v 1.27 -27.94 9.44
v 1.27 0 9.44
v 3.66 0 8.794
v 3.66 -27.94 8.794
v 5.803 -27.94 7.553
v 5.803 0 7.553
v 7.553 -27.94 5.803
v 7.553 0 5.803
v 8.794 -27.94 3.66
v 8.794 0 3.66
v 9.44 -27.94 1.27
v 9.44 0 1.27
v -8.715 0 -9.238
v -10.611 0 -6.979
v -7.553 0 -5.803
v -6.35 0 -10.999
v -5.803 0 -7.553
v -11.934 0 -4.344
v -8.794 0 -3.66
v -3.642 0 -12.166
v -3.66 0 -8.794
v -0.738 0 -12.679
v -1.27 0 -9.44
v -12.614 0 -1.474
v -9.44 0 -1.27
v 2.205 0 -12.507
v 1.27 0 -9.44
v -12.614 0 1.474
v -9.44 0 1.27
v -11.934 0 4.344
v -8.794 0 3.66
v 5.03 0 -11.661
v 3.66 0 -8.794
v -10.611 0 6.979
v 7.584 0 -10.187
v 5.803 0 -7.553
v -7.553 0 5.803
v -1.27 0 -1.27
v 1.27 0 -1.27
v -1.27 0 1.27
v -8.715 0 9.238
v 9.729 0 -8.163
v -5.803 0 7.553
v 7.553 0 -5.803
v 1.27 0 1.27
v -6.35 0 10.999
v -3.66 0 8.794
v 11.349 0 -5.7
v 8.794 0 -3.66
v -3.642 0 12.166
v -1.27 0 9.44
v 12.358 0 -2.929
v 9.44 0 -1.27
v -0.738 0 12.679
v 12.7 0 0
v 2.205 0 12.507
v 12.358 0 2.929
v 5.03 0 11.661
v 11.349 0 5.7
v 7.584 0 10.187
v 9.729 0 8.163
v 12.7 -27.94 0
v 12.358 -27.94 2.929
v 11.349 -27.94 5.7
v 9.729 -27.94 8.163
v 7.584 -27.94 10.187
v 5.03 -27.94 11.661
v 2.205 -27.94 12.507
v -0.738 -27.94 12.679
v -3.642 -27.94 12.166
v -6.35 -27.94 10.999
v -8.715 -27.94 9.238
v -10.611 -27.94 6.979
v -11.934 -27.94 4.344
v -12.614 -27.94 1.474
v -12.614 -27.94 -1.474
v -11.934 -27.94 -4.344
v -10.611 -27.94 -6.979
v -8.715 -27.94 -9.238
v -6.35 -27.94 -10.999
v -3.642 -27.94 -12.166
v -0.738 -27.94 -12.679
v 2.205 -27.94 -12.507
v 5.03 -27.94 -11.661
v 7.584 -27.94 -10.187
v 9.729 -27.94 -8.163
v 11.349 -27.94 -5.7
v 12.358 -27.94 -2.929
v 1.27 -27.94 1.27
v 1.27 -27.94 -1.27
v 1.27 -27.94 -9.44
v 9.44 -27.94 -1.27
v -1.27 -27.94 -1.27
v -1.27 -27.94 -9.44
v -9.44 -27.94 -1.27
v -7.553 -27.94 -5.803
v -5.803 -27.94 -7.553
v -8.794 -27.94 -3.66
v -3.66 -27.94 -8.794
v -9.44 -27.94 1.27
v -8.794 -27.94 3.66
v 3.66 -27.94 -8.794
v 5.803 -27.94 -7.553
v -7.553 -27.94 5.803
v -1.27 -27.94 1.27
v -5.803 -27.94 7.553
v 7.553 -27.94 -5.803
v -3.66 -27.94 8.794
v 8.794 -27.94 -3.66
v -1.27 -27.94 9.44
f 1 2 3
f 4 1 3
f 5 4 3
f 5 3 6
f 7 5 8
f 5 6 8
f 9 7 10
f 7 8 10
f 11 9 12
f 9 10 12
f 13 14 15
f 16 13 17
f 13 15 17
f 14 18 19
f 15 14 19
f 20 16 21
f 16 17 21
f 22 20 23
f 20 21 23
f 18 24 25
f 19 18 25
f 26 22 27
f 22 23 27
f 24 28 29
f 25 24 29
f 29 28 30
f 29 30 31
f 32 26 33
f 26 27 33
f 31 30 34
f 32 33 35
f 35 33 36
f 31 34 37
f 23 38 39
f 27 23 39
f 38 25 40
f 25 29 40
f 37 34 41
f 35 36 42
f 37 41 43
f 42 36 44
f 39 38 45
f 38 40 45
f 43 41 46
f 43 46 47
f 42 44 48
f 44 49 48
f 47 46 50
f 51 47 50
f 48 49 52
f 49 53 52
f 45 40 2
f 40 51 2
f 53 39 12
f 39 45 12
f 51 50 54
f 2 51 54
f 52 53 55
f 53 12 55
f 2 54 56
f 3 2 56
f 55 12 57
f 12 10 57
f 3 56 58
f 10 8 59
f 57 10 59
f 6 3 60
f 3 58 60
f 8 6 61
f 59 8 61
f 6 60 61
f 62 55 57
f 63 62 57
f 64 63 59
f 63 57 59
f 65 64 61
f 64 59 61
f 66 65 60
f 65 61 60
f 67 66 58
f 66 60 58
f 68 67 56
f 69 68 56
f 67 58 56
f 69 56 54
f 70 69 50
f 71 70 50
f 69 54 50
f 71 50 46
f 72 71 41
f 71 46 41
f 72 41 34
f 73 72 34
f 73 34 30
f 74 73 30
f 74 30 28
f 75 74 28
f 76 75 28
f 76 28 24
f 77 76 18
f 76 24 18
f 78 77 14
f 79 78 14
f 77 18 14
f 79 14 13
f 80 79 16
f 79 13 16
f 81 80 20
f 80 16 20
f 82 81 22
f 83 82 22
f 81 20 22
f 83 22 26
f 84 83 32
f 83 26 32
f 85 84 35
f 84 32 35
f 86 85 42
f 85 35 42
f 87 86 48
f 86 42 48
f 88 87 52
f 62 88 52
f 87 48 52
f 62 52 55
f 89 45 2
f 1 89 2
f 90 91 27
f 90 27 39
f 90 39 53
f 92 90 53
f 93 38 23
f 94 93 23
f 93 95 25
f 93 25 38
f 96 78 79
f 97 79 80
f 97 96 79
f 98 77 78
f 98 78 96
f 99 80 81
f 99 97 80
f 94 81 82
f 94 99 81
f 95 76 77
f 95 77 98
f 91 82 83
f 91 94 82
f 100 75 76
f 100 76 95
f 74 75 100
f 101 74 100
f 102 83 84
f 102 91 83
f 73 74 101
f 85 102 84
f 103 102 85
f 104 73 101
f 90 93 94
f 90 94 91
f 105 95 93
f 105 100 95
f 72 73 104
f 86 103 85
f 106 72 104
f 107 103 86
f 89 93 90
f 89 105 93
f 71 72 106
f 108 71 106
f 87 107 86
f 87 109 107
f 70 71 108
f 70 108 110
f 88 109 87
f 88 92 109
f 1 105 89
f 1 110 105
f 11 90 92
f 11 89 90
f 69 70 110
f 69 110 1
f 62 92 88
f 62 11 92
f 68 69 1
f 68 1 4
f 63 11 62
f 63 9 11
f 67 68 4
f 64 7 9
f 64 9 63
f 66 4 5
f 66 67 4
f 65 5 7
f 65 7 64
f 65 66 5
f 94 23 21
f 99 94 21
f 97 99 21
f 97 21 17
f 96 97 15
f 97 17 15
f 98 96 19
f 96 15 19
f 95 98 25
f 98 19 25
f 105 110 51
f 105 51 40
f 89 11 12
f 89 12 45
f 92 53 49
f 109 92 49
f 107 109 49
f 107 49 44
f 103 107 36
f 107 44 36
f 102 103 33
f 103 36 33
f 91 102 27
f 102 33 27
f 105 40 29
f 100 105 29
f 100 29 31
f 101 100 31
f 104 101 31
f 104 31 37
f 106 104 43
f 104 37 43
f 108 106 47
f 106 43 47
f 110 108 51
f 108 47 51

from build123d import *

# Parameters (mm, degrees)
F0_R     = 12.7
F0_W     = 2.54
F0_H     = 2.54
F1_DEPTH = 27.94


with BuildPart() as f1:
    # F0 (on Front) → F1 (new body)
    with BuildSketch(Plane.XZ):
        Circle(F0_R)
        with BuildLine():
            ThreePointArc((1.27, 9.4399536545), (6.7351920908, 6.7351920908), (9.4399536545, 1.27))
            Line((9.4399536545, 1.27), (11.43, 1.27))
            Line((11.43, 1.27), (11.43, -1.27))
            Line((11.43, -1.27), (9.4399536545, -1.27))
            ThreePointArc((9.4399536545, -1.27), (6.7351920908, -6.7351920908), (1.27, -9.4399536545))
            Line((1.27, -9.4399536545), (1.27, -11.43))
            Line((1.27, -11.43), (-1.27, -11.43))
            Line((-1.27, -11.43), (-1.27, -9.4399536545))
            ThreePointArc((-1.27, -9.4399536545), (-6.7351920908, -6.7351920908), (-9.4399536545, -1.27))
            Line((-9.4399536545, -1.27), (-11.43, -1.27))
            Line((-11.43, -1.27), (-11.43, 1.27))
            Line((-11.43, 1.27), (-9.4399536545, 1.27))
            ThreePointArc((-9.4399536545, 1.27), (-6.7351920908, 6.7351920908), (-1.27, 9.4399536545))
            Line((-1.27, 9.4399536545), (-1.27, 11.43))
            Line((-1.27, 11.43), (1.27, 11.43))
            Line((1.27, 11.43), (1.27, 9.4399536545))
        make_face(mode=Mode.SUBTRACT)
        with BuildLine():
            ThreePointArc((9.4399536545, -1.27), (9.5037146306, -0.6364222028), (9.525, 0))
            ThreePointArc((9.525, 0), (9.5037146306, 0.6364222028), (9.4399536545, 1.27))
            Line((9.4399536545, 1.27), (1.27, 1.27))
            Line((1.27, 1.27), (1.27, -1.27))
            Line((1.27, -1.27), (9.4399536545, -1.27))
        make_face()
        with BuildLine():
            Line((-1.27, -1.27), (-1.27, 1.27))
            Line((-1.27, 1.27), (-9.4399536545, 1.27))
            ThreePointArc((-9.4399536545, 1.27), (-9.525, 0), (-9.4399536545, -1.27))
            Line((-9.4399536545, -1.27), (-1.27, -1.27))
        make_face()
        with BuildLine():
            Line((1.27, 1.27), (1.27, 9.4399536545))
            ThreePointArc((1.27, 9.4399536545), (0, 9.525), (-1.27, 9.4399536545))
            Line((-1.27, 9.4399536545), (-1.27, 1.27))
            Line((-1.27, 1.27), (1.27, 1.27))
        make_face()
        with BuildLine():
            ThreePointArc((-1.27, -9.4399536545), (0, -9.525), (1.27, -9.4399536545))
            Line((1.27, -9.4399536545), (1.27, -1.27))
            Line((1.27, -1.27), (-1.27, -1.27))
            Line((-1.27, -1.27), (-1.27, -9.4399536545))
        make_face()
        Rectangle(F0_W, F0_H)
        with BuildLine():
            ThreePointArc((-9.4399536545, -1.27), (-9.525, 0), (-9.4399536545, 1.27))
            Line((-9.4399536545, 1.27), (-11.43, 1.27))
            Line((-11.43, 1.27), (-11.43, -1.27))
            Line((-11.43, -1.27), (-9.4399536545, -1.27))
        make_face()
        with BuildLine():
            ThreePointArc((-1.27, 9.4399536545), (0, 9.525), (1.27, 9.4399536545))
            Line((1.27, 9.4399536545), (1.27, 11.43))
            Line((1.27, 11.43), (-1.27, 11.43))
            Line((-1.27, 11.43), (-1.27, 9.4399536545))
        make_face()
        with BuildLine():
            Line((1.27, -11.43), (1.27, -9.4399536545))
            ThreePointArc((1.27, -9.4399536545), (0, -9.525), (-1.27, -9.4399536545))
            Line((-1.27, -9.4399536545), (-1.27, -11.43))
            Line((-1.27, -11.43), (1.27, -11.43))
        make_face()
        with BuildLine():
            ThreePointArc((9.4399536545, 1.27), (9.5037146306, 0.6364222028), (9.525, 0))
            ThreePointArc((9.525, 0), (9.5037146306, -0.6364222028), (9.4399536545, -1.27))
            Line((9.4399536545, -1.27), (11.43, -1.27))
            Line((11.43, -1.27), (11.43, 1.27))
            Line((11.43, 1.27), (9.4399536545, 1.27))
        make_face()
    extrude(amount=F1_DEPTH)


solid = f1.part
